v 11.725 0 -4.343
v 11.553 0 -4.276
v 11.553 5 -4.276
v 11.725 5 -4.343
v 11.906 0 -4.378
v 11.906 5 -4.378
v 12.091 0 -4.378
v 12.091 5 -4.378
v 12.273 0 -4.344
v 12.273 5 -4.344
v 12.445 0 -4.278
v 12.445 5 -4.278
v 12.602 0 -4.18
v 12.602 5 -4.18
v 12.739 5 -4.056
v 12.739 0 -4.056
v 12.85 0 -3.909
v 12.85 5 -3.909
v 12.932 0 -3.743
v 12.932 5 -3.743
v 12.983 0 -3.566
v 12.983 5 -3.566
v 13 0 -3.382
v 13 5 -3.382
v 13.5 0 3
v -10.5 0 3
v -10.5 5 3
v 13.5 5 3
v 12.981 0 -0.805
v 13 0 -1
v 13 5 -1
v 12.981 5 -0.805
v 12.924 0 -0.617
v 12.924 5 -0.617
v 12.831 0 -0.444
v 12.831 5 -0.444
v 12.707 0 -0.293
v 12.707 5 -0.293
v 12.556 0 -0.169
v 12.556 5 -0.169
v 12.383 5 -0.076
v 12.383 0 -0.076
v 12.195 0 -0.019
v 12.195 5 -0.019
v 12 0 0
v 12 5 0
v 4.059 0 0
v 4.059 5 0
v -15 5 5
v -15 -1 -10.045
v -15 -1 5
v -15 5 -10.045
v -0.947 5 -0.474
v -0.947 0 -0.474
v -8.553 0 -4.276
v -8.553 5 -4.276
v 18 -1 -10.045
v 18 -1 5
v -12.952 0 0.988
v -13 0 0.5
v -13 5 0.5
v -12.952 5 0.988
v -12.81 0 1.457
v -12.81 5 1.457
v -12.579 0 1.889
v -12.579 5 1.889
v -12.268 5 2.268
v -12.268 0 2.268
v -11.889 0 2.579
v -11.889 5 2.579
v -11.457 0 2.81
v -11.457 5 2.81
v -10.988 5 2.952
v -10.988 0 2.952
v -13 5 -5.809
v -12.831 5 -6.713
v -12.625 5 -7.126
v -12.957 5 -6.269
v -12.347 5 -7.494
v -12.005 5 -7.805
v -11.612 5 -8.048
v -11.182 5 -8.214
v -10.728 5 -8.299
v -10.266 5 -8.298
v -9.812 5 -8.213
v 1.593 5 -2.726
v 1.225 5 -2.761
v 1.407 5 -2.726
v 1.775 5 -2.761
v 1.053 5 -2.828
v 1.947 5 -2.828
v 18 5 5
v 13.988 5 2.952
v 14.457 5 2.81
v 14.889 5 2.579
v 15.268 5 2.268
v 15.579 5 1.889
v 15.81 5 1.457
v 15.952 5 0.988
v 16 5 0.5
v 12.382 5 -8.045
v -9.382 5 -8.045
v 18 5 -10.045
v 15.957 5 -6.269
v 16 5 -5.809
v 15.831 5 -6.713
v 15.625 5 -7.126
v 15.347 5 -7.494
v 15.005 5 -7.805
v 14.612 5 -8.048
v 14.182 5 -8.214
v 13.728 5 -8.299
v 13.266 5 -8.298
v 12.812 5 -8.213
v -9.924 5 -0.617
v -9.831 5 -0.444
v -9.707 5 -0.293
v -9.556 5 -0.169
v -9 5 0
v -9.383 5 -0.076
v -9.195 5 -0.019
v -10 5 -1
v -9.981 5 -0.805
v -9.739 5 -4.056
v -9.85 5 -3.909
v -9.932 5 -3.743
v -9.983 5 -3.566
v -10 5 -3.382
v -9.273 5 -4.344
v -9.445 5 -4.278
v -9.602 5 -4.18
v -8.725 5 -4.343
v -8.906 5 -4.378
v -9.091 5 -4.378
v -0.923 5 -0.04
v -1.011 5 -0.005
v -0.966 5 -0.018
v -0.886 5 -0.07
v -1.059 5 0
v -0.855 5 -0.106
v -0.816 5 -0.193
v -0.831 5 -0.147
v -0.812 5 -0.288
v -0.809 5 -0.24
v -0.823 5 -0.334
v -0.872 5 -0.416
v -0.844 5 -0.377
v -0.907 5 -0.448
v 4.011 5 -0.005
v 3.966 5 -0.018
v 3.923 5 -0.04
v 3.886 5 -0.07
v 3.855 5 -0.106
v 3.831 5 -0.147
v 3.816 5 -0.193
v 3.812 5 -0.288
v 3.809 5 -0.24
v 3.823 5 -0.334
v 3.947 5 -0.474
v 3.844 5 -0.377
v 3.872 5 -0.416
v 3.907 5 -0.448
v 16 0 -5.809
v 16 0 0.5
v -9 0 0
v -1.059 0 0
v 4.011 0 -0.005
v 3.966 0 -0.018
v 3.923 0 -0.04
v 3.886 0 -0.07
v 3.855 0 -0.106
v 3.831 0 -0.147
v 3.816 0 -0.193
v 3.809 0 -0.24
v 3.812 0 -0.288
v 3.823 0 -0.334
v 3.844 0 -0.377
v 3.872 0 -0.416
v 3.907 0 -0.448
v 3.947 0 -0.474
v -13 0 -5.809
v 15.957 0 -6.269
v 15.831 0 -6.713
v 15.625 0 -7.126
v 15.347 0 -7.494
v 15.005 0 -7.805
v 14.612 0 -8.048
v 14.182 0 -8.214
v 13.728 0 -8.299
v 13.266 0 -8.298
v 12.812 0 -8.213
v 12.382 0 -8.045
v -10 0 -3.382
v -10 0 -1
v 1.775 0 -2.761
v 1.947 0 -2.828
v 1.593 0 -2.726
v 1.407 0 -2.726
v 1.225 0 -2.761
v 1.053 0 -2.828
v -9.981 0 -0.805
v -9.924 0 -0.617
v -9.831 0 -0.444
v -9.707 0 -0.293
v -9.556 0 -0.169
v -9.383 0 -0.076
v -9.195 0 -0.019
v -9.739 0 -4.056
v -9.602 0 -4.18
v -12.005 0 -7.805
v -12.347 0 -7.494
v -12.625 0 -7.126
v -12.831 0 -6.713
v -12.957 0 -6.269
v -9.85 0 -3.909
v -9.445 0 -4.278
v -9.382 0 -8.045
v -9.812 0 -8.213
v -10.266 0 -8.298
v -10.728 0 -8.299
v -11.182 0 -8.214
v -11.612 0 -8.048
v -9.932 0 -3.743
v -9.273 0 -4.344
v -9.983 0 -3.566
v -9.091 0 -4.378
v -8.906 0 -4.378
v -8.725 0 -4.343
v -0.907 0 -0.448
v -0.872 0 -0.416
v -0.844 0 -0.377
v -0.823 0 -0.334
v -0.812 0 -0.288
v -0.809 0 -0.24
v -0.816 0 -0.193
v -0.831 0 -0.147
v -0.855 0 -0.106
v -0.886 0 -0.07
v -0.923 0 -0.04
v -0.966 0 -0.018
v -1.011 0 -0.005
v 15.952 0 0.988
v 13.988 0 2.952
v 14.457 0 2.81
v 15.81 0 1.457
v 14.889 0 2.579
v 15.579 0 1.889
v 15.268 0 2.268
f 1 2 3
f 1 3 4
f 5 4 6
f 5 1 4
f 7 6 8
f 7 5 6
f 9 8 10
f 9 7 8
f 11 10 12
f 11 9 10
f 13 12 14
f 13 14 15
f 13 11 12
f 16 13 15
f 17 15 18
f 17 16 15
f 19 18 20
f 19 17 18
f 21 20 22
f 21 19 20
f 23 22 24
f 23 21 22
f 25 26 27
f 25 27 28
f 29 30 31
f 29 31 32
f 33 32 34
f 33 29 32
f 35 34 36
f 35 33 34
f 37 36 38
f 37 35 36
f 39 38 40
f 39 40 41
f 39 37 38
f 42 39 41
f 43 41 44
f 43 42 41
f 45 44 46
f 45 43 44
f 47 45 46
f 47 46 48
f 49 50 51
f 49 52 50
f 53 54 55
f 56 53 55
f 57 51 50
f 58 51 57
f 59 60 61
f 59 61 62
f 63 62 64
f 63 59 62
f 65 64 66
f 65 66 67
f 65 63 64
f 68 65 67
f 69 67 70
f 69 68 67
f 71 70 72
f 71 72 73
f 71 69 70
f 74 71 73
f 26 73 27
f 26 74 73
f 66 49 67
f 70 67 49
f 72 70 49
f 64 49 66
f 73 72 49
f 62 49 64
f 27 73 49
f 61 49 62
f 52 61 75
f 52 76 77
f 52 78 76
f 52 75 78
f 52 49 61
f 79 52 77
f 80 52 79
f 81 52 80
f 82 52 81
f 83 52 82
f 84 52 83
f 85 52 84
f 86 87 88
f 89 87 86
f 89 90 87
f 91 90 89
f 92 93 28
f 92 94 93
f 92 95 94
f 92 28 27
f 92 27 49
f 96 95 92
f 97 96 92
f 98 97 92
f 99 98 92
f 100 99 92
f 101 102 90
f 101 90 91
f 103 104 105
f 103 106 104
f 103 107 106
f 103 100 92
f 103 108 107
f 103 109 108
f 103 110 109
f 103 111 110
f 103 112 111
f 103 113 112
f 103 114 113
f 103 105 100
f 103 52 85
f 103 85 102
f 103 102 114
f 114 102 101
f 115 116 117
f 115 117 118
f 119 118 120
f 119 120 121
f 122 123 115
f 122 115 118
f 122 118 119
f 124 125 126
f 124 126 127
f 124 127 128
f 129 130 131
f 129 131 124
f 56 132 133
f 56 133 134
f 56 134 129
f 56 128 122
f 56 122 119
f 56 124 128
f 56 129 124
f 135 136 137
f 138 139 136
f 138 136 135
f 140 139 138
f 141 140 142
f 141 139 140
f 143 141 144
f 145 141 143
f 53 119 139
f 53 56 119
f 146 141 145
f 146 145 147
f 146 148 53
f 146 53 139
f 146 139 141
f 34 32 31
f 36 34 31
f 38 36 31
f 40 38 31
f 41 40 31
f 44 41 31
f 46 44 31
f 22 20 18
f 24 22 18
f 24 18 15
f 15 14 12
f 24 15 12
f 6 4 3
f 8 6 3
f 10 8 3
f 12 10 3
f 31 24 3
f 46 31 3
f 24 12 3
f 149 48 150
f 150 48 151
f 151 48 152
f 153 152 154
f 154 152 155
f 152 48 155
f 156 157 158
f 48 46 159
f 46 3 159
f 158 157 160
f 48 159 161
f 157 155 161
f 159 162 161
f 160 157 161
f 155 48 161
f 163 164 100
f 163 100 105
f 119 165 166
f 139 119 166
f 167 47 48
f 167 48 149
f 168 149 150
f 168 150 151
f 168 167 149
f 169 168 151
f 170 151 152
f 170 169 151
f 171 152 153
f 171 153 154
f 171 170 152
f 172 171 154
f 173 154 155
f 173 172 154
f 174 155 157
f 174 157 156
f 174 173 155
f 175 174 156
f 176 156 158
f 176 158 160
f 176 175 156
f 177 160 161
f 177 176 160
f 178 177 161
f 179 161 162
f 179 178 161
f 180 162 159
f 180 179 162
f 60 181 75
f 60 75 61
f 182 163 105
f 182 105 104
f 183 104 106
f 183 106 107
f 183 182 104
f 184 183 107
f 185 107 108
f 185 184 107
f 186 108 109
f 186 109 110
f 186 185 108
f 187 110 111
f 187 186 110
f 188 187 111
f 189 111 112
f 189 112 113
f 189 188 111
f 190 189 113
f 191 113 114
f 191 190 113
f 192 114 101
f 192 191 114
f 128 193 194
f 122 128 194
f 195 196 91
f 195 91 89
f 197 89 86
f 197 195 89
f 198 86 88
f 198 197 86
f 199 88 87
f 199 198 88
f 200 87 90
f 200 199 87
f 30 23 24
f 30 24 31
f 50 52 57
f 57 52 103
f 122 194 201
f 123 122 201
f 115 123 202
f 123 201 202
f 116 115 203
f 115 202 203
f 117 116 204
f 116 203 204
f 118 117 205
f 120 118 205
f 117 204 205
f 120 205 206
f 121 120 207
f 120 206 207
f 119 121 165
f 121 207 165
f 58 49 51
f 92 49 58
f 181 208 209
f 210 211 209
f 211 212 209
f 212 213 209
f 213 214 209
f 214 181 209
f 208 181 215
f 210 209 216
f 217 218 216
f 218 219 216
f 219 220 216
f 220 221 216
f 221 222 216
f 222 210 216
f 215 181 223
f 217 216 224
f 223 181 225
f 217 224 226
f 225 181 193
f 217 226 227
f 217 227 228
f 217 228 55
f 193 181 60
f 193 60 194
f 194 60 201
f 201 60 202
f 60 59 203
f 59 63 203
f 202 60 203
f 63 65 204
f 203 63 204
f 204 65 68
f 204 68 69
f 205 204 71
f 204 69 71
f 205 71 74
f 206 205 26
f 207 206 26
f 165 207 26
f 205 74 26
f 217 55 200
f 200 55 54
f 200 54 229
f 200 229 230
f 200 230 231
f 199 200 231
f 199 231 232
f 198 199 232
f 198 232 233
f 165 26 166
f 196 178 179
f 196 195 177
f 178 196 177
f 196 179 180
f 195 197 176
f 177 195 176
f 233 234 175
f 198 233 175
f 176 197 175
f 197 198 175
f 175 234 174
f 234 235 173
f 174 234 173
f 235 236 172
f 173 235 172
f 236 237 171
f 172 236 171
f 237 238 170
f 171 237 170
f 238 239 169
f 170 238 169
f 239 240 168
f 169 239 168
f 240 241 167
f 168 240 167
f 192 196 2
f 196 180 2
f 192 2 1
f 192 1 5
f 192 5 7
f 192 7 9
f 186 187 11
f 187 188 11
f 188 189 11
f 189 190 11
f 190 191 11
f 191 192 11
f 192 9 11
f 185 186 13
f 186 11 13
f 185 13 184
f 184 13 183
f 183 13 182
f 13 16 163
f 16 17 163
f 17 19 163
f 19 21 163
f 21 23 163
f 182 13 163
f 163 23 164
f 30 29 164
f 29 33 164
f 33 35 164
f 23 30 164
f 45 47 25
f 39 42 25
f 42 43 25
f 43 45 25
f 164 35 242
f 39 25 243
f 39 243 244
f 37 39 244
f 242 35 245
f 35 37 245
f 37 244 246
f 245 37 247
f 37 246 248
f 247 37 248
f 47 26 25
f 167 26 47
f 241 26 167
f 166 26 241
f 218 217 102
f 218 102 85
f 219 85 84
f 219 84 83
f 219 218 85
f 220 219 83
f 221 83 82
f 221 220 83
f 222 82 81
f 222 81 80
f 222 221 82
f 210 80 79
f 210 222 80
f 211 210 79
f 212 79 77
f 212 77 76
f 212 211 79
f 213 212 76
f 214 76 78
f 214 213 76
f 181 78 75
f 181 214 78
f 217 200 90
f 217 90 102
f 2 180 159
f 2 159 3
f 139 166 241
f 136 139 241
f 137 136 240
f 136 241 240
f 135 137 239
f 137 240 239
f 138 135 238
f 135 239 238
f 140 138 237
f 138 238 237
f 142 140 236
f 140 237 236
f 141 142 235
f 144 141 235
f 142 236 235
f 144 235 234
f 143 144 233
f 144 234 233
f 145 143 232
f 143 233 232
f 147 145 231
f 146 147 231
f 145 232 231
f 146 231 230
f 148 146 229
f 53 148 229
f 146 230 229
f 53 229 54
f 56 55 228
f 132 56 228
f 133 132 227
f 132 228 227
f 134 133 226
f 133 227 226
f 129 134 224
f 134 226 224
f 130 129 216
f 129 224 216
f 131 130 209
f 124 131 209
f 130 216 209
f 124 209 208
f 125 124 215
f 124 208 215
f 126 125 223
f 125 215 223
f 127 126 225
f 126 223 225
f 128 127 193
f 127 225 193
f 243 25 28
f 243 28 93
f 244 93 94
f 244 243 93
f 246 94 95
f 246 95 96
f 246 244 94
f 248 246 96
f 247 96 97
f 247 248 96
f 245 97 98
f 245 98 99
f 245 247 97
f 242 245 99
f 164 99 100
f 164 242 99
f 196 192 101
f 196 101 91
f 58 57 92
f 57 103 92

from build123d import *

# Parameters (mm, degrees)
BOSS_EXTRUDE1_DEPTH   = 5
BOSS_EXTRUDE1_2_DEPTH = 5
SKETCH1_W             = 33
SKETCH1_H             = 15.045084972
BOSS_EXTRUDE1_3_DEPTH = 5
SKETCH2_W             = 33
SKETCH2_H             = 15.045084972
BOSS_EXTRUDE3_DEPTH   = 1


with BuildPart() as part:
    # Sketch1 → Boss-Extrude1 (new body)
    with BuildSketch(Plane(origin=(0, 0, 0), x_dir=(1, 0, 0), z_dir=(0, 1, 0))):
        with BuildLine():
            Line((-0.947213595, 0.473606798), (-8.552786405, 4.276393202))
            ThreePointArc((-8.552786405, 4.276393202), (-9.525731112, 4.23261682), (-10, 3.381966011))
            Line((-10, 3.381966011), (-10, 1))
            ThreePointArc((-10, 1), (-9.707106781, 0.292893219), (-9, 0))
            Line((-9, 0), (-1.059016994, 0))
            ThreePointArc((-1.059016994, 0), (-0.815704747, 0.19256177), (-0.947213595, 0.473606798))
        make_face()
    extrude(amount=BOSS_EXTRUDE1_DEPTH)



with BuildPart() as body_2:
    # Sketch1 → Boss-Extrude1 2 (new body)
    with BuildSketch(Plane(origin=(0, 0, 0), x_dir=(1, 0, 0), z_dir=(0, 1, 0))):
        with BuildLine():
            Line((12, 0), (4.059016994, 0))
            ThreePointArc((4.059016994, 0), (3.815704747, 0.19256177), (3.947213595, 0.473606798))
            Line((3.947213595, 0.473606798), (11.552786405, 4.276393202))
            ThreePointArc((11.552786405, 4.276393202), (12.525731112, 4.23261682), (13, 3.381966011))
            Line((13, 3.381966011), (13, 1))
            ThreePointArc((13, 1), (12.707106781, 0.292893219), (12, 0))
        make_face()
    extrude(amount=BOSS_EXTRUDE1_2_DEPTH)


with BuildPart() as body_3:
    # Sketch1 → Boss-Extrude1 3 (new body)
    with BuildSketch(Plane(origin=(0, 0, 0), x_dir=(1, 0, 0), z_dir=(0, 1, 0))):
        with Locations((1.5, 2.522542486)):
            Rectangle(SKETCH1_W, SKETCH1_H)
        with BuildLine():
            Line((1.052786405, 2.827708764), (-9.381966011, 8.045084972))
            ThreePointArc((-9.381966011, 8.045084972), (-11.81432778, 7.935644015), (-13, 5.809016994))
            Line((-13, 5.809016994), (-13, -0.5))
            ThreePointArc((-13, -0.5), (-12.267766953, -2.267766953), (-10.5, -3))
            Line((-10.5, -3), (13.5, -3))
            ThreePointArc((13.5, -3), (15.267766953, -2.267766953), (16, -0.5))
            Line((16, -0.5), (16, 5.809016994))
            ThreePointArc((16, 5.809016994), (14.81432778, 7.935644015), (12.381966011, 8.045084972))
            Line((12.381966011, 8.045084972), (1.947213595, 2.827708764))
            ThreePointArc((1.947213595, 2.827708764), (1.5, 2.722135955), (1.052786405, 2.827708764))
        make_face(mode=Mode.SUBTRACT)
    extrude(amount=BOSS_EXTRUDE1_3_DEPTH)


with BuildPart() as part_1:
    add(part.part)

    add(body_2.part)  # Boss-Extrude3 merges body 2

    add(body_3.part)  # Boss-Extrude3 merges body 3
    # Sketch2 → Boss-Extrude3 (add)
    with BuildSketch(Plane.XZ):
        with Locations((1.5, -2.522542486)):
            Rectangle(SKETCH2_W, SKETCH2_H)
    extrude(amount=BOSS_EXTRUDE3_DEPTH)


solid = part_1.part
